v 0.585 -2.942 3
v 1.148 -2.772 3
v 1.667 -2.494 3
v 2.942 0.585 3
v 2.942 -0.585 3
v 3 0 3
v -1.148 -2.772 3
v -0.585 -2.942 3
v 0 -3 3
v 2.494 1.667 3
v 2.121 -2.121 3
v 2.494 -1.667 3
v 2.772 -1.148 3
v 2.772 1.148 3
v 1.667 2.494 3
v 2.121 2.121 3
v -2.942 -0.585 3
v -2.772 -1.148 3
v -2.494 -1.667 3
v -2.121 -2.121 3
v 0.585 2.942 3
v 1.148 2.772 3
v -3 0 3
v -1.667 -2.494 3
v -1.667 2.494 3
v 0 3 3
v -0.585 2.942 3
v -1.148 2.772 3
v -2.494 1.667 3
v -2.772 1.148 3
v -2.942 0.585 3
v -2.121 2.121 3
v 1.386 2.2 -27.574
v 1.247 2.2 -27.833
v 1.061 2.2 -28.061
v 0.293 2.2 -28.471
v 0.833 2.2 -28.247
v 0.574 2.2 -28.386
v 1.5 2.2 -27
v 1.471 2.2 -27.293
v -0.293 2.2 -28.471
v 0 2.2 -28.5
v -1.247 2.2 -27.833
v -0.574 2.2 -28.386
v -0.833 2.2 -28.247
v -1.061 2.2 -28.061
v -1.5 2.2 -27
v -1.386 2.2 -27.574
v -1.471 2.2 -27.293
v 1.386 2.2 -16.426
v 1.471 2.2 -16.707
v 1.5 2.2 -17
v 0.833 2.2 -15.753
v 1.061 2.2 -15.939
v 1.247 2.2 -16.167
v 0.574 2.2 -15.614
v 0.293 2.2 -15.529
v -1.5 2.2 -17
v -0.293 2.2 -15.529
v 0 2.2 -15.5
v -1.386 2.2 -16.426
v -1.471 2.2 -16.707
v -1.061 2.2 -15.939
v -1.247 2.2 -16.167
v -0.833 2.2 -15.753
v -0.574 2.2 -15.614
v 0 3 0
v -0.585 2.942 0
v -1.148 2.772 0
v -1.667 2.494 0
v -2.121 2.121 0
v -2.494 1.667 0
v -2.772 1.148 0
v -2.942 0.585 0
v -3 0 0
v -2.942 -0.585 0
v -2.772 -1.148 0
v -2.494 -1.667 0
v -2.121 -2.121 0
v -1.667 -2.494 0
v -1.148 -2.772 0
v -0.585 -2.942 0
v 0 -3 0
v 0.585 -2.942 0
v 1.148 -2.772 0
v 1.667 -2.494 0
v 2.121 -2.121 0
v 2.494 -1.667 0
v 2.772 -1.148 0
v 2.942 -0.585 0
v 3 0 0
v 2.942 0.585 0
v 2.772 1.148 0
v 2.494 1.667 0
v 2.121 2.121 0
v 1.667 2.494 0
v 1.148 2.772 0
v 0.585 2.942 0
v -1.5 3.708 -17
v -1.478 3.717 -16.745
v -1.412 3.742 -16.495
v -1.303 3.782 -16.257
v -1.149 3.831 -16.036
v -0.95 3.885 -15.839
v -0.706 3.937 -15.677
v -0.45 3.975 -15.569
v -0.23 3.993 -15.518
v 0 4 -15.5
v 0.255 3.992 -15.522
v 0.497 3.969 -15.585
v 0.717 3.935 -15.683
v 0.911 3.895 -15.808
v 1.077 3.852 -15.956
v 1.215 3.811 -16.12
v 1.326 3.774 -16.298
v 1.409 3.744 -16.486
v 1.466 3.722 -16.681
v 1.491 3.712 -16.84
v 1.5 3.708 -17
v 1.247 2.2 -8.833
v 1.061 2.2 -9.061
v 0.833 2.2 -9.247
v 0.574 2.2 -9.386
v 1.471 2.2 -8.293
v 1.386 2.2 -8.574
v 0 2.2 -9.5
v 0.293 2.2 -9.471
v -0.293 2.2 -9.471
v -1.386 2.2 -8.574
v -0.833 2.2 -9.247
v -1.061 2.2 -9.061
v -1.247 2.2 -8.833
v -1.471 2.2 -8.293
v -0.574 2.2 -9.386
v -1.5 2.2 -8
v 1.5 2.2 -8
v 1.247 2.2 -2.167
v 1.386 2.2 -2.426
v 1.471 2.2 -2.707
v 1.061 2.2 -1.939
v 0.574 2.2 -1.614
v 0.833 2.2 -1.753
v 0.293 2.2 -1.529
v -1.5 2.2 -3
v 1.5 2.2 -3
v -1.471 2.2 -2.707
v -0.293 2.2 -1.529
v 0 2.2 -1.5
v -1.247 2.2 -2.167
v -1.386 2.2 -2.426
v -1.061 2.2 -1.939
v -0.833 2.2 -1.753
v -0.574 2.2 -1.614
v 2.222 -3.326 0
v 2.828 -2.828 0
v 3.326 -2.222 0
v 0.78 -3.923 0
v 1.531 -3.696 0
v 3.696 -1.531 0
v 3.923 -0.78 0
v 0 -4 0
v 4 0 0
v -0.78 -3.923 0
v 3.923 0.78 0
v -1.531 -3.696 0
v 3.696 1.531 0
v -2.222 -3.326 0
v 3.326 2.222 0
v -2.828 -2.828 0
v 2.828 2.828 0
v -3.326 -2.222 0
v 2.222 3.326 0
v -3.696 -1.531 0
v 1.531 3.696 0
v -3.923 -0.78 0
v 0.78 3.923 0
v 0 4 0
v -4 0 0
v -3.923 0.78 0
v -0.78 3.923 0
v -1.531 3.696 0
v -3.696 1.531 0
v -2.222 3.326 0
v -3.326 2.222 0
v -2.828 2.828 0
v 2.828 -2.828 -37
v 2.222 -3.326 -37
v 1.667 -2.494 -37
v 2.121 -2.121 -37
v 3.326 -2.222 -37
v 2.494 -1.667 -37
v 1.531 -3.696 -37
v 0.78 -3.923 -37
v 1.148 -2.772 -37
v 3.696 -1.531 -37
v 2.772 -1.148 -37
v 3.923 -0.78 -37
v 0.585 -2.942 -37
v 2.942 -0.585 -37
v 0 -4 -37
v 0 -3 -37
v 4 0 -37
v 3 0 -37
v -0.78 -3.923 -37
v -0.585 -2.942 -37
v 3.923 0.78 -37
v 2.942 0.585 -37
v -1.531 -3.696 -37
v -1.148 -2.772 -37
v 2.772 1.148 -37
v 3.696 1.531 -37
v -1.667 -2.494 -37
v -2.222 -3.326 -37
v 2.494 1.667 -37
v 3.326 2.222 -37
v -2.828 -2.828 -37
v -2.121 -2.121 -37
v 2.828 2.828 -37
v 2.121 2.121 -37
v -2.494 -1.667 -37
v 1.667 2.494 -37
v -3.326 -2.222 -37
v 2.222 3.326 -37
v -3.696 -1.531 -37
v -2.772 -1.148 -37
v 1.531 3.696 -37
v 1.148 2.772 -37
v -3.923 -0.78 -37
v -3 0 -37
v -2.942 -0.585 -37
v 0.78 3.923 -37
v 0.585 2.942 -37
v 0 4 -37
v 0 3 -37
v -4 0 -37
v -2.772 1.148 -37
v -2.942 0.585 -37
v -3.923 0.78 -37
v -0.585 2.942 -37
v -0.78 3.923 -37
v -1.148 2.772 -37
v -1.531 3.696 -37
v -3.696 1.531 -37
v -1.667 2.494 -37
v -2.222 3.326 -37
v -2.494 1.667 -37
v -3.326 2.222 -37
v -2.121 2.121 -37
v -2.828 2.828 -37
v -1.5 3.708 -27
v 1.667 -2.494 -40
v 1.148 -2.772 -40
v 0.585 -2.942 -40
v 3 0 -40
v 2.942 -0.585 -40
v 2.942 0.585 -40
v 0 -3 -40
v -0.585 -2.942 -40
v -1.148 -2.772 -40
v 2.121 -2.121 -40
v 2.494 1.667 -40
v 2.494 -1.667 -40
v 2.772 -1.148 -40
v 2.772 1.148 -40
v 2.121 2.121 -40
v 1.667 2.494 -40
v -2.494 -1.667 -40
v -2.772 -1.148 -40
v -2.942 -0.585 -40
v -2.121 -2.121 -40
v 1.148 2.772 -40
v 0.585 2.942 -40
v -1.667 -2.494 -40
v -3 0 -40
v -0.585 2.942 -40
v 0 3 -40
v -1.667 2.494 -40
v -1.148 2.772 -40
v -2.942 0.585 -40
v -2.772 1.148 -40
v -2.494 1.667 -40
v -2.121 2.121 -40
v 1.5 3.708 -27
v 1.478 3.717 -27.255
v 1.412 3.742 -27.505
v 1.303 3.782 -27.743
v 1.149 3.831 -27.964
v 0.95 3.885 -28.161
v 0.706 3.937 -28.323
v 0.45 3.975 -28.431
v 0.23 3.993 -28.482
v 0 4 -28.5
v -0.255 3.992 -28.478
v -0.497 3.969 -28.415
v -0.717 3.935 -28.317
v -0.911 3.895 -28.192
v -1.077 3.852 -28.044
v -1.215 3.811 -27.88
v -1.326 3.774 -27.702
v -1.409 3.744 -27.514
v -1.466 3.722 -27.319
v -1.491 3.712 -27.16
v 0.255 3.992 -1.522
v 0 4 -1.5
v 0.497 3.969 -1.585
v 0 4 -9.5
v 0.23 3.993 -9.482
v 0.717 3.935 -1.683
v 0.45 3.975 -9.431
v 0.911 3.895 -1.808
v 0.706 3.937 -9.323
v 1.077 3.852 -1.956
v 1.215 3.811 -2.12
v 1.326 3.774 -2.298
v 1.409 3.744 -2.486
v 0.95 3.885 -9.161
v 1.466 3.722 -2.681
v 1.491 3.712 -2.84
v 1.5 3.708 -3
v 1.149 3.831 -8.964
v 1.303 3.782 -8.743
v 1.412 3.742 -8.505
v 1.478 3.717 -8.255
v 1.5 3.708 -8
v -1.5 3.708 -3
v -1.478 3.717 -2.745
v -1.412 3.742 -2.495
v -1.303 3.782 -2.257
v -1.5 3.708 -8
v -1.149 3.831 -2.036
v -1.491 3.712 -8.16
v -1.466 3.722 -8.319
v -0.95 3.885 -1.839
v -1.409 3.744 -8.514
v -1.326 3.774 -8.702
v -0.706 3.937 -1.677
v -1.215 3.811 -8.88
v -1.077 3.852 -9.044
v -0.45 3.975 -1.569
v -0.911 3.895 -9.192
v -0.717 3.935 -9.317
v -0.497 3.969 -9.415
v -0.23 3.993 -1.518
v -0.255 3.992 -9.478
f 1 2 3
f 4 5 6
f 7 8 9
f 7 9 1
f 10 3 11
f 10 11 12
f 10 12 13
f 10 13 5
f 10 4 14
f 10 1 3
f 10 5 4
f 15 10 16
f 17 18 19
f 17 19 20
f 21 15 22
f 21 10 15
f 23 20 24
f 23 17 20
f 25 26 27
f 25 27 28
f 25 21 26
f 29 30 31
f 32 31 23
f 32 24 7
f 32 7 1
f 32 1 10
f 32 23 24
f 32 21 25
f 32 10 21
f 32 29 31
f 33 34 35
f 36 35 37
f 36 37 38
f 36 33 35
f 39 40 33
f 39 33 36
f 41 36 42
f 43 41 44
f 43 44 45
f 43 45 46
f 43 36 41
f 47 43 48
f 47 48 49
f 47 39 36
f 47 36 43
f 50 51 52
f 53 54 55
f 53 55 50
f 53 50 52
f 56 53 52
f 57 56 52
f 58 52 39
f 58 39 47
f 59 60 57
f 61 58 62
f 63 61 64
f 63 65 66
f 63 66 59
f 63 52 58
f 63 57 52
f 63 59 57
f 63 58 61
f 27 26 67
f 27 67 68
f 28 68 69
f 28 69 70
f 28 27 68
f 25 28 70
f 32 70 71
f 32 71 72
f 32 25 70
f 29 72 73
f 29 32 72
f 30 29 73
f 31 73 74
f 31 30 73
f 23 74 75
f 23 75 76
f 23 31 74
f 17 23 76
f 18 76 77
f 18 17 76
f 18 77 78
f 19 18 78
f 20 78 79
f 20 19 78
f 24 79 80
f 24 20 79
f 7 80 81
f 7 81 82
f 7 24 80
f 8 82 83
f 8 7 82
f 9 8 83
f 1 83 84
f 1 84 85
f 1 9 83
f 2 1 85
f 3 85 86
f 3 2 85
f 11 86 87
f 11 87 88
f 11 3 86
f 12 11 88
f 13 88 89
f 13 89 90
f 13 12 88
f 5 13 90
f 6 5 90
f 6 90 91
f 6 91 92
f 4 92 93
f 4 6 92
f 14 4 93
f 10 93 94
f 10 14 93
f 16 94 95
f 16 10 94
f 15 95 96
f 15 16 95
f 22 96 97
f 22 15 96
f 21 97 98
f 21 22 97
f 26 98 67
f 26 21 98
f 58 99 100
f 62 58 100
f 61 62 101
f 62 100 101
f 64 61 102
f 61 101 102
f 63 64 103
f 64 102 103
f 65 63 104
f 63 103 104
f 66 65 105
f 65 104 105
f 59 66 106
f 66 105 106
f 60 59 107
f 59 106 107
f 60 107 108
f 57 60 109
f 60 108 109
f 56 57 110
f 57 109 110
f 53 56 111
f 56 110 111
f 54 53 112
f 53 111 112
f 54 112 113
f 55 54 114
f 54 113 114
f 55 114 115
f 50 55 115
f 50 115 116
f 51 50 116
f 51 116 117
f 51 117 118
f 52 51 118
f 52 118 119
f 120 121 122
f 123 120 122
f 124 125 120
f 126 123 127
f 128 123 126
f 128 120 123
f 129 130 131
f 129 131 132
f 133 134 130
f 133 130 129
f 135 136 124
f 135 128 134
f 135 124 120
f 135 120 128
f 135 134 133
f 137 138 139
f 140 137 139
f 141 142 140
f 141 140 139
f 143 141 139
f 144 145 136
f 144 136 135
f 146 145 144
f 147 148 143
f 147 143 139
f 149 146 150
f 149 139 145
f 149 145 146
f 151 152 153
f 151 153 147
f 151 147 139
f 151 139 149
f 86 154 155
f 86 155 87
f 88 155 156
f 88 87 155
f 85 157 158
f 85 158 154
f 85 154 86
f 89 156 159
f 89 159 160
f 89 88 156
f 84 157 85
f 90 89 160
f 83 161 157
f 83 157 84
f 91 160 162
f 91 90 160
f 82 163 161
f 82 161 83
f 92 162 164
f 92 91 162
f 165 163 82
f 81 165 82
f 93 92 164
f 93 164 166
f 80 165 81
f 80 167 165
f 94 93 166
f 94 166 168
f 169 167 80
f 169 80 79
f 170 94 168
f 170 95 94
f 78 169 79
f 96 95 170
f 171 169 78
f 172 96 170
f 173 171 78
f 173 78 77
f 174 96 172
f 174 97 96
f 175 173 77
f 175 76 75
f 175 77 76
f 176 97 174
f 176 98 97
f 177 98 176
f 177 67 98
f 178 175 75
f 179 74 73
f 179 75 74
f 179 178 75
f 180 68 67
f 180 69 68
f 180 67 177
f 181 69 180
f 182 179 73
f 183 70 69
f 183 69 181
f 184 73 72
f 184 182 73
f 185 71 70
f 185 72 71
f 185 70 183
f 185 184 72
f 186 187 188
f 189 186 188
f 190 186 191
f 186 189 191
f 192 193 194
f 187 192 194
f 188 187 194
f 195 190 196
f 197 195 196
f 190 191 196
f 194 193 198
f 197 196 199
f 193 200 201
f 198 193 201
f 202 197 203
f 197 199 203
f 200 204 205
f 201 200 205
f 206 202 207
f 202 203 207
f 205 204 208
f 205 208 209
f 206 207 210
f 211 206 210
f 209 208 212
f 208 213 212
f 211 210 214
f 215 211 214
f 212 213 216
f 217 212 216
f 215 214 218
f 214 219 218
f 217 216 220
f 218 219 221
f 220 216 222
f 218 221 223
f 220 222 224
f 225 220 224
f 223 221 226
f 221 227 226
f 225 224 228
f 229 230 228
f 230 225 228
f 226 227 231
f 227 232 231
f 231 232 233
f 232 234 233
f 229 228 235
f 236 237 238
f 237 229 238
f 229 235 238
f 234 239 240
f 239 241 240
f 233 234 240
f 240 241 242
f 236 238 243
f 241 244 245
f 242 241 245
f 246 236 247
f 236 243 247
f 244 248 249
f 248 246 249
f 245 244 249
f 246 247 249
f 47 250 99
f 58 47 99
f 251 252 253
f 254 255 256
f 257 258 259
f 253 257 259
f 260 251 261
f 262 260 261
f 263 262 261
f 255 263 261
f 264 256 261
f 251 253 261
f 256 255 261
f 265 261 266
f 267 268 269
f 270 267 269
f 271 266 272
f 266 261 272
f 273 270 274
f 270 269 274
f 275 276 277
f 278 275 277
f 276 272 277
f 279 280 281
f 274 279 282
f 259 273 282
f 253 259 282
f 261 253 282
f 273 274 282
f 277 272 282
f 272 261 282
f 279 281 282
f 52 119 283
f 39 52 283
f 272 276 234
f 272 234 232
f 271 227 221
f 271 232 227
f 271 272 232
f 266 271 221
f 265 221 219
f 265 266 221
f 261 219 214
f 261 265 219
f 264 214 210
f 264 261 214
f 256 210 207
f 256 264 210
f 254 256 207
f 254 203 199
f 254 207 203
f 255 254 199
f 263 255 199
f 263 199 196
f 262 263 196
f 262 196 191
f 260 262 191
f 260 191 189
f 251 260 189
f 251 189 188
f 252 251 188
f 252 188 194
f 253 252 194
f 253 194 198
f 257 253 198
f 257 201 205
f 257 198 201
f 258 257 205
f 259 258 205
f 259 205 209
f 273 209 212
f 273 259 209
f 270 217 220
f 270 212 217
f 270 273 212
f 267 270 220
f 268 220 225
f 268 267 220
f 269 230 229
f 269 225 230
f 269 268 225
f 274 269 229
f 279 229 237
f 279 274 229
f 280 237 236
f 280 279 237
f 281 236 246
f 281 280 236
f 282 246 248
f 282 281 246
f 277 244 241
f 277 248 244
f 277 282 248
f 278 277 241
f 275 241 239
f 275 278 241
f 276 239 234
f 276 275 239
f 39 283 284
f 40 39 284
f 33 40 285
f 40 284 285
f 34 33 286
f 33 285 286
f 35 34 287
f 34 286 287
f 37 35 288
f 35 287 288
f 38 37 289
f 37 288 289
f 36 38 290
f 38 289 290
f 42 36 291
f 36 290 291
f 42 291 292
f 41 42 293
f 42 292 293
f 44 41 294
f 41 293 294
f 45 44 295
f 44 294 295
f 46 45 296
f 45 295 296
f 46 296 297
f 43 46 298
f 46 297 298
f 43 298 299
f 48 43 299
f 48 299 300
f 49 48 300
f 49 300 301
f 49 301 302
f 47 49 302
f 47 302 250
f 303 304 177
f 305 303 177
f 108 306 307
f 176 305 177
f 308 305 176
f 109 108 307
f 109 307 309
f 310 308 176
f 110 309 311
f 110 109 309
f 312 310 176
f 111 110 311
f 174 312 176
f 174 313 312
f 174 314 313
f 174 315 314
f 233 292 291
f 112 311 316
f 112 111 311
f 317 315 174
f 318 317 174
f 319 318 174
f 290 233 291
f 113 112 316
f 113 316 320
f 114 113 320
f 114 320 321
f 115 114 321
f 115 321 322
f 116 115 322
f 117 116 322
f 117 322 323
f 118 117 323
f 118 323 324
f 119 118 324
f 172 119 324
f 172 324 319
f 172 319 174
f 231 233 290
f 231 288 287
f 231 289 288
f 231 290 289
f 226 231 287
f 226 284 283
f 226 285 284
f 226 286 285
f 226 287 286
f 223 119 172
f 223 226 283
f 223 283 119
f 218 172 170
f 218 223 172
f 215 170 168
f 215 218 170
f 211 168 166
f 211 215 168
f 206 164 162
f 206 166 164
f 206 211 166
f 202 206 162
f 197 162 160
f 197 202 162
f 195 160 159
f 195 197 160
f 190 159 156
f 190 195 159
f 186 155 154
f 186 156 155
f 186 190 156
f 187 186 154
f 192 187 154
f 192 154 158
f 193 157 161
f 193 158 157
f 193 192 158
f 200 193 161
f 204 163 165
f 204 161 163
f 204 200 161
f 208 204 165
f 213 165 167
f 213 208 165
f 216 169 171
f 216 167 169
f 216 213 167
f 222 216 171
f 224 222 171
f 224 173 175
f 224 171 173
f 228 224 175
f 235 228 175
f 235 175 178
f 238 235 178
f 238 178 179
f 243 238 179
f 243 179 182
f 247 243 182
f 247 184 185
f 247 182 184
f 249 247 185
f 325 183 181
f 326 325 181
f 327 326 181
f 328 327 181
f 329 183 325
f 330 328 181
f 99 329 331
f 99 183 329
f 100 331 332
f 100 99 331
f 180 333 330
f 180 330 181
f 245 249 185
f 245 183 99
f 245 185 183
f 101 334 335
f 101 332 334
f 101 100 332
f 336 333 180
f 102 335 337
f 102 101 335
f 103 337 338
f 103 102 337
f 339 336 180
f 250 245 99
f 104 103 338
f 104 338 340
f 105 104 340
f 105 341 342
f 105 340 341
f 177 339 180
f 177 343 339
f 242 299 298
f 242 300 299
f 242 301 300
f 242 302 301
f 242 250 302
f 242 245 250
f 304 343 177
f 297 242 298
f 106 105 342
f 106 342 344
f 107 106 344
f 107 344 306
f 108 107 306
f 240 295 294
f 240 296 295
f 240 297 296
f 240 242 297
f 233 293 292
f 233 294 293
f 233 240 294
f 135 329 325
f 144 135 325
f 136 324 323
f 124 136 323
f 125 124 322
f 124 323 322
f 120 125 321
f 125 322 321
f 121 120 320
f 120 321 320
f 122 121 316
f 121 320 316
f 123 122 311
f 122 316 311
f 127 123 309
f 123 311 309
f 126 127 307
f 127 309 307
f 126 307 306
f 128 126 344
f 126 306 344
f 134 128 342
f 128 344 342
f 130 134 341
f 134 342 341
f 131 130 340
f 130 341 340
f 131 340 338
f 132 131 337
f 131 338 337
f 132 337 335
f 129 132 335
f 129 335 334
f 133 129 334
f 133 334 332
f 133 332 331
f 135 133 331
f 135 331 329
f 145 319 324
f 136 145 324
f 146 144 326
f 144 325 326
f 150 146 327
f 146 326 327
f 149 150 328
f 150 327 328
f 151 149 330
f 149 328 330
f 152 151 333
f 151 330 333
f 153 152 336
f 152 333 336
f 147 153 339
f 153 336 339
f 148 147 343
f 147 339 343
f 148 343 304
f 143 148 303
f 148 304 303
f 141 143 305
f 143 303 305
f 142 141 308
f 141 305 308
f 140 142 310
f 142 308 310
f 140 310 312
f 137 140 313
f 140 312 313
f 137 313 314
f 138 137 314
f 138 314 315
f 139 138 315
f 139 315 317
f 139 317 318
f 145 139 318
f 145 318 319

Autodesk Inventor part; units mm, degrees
ref_plane "YZ Plane" through (0, 0, 0) normal (1, 0, 0) x (0, 1, 0)
ref_plane "XZ Plane" through (0, 0, 0) normal (0, 1, 0) x (-1, 0, 0)
ref_plane "XY Plane" through (0, 0, 0) normal (0, 0, 1) x (1, 0, 0)
sketch "スケッチ1" plane through (0, 0, 0) normal (1, 0, 0) x (0, 1, 0)
  line L0 (0, 0) -> (3, 0)
  line L1 (3, 0) -> (3, 3)
  line L2 (3, 3) -> (0, 3)
  line L3 (0, 3) -> (0, 0)
  line L4 (0, 0) -> (4, 0)
  line L5 (4, 0) -> (4, -37)
  line L6 (4, -37) -> (0, -37)
  line L7 (0, -37) -> (0, 0)
  line L8 (0, -37) -> (3, -37)
  line L9 (3, -37) -> (3, -40)
  line L10 (3, -40) -> (0, -40)
  line L11 (0, -40) -> (0, -37)
  dimension "d0" = 3
  dimension "d1" = 3
  dimension "d2" = 4
  dimension "d3" = 37
  dimension "d4" = 3
  dimension "d5" = 3
revolve "回転1" add sketch "スケッチ1" angle 360 about axis through (0, 0, -37) along (0, 0, 1)
sketch "スケッチ2" plane through (0, 0, 0) normal (0, 0, 1) x (1, 0, 0)
  circle A0 centre (0, 0) radius 4 projected
  point P0 (0, 4)
ref_plane "作業平面1" through (0, 4, 0) normal (0, 1, 0) x (-1, 0, 0)
sketch "スケッチ3" plane through (0, 4, 0) normal (0, 1, 0) x (-1, 0, 0)
  line L0 (0, 0) -> (0, 3)
  line L1 (3, 3) -> (-3, 3) projected
  line L2 (1.5, -3) -> (-1.5, -3)
  line L3 (-1.5, -3) -> (-1.5, -8)
  line L4 (-1.5, -8) -> (1.5, -8)
  line L5 (1.5, -8) -> (1.5, -3)
  line L6 (4, 0) -> (-4, 0) projected
  circle A0 centre (0, -3) radius 1.5
  circle A1 centre (0, -8) radius 1.5
  line L7 (-1.5, -27) -> (1.5, -27)
  line L8 (1.5, -27) -> (1.5, -17)
  line L9 (1.5, -17) -> (-1.5, -17)
  line L10 (-1.5, -17) -> (-1.5, -27)
  circle A2 centre (0, -27) radius 1.5
  circle A3 centre (0, -17) radius 1.5
  dimension "d7" = 3
  dimension "d8" = 5
  dimension "d9" = 3
  dimension "d12" = 3
  dimension "d13" = 9
  dimension "d14" = 10
extrude "押し出し1" cut sketch "スケッチ3" against normal blind 1.8
properties part number "入力軸" material "鋼、炭素鋼"
